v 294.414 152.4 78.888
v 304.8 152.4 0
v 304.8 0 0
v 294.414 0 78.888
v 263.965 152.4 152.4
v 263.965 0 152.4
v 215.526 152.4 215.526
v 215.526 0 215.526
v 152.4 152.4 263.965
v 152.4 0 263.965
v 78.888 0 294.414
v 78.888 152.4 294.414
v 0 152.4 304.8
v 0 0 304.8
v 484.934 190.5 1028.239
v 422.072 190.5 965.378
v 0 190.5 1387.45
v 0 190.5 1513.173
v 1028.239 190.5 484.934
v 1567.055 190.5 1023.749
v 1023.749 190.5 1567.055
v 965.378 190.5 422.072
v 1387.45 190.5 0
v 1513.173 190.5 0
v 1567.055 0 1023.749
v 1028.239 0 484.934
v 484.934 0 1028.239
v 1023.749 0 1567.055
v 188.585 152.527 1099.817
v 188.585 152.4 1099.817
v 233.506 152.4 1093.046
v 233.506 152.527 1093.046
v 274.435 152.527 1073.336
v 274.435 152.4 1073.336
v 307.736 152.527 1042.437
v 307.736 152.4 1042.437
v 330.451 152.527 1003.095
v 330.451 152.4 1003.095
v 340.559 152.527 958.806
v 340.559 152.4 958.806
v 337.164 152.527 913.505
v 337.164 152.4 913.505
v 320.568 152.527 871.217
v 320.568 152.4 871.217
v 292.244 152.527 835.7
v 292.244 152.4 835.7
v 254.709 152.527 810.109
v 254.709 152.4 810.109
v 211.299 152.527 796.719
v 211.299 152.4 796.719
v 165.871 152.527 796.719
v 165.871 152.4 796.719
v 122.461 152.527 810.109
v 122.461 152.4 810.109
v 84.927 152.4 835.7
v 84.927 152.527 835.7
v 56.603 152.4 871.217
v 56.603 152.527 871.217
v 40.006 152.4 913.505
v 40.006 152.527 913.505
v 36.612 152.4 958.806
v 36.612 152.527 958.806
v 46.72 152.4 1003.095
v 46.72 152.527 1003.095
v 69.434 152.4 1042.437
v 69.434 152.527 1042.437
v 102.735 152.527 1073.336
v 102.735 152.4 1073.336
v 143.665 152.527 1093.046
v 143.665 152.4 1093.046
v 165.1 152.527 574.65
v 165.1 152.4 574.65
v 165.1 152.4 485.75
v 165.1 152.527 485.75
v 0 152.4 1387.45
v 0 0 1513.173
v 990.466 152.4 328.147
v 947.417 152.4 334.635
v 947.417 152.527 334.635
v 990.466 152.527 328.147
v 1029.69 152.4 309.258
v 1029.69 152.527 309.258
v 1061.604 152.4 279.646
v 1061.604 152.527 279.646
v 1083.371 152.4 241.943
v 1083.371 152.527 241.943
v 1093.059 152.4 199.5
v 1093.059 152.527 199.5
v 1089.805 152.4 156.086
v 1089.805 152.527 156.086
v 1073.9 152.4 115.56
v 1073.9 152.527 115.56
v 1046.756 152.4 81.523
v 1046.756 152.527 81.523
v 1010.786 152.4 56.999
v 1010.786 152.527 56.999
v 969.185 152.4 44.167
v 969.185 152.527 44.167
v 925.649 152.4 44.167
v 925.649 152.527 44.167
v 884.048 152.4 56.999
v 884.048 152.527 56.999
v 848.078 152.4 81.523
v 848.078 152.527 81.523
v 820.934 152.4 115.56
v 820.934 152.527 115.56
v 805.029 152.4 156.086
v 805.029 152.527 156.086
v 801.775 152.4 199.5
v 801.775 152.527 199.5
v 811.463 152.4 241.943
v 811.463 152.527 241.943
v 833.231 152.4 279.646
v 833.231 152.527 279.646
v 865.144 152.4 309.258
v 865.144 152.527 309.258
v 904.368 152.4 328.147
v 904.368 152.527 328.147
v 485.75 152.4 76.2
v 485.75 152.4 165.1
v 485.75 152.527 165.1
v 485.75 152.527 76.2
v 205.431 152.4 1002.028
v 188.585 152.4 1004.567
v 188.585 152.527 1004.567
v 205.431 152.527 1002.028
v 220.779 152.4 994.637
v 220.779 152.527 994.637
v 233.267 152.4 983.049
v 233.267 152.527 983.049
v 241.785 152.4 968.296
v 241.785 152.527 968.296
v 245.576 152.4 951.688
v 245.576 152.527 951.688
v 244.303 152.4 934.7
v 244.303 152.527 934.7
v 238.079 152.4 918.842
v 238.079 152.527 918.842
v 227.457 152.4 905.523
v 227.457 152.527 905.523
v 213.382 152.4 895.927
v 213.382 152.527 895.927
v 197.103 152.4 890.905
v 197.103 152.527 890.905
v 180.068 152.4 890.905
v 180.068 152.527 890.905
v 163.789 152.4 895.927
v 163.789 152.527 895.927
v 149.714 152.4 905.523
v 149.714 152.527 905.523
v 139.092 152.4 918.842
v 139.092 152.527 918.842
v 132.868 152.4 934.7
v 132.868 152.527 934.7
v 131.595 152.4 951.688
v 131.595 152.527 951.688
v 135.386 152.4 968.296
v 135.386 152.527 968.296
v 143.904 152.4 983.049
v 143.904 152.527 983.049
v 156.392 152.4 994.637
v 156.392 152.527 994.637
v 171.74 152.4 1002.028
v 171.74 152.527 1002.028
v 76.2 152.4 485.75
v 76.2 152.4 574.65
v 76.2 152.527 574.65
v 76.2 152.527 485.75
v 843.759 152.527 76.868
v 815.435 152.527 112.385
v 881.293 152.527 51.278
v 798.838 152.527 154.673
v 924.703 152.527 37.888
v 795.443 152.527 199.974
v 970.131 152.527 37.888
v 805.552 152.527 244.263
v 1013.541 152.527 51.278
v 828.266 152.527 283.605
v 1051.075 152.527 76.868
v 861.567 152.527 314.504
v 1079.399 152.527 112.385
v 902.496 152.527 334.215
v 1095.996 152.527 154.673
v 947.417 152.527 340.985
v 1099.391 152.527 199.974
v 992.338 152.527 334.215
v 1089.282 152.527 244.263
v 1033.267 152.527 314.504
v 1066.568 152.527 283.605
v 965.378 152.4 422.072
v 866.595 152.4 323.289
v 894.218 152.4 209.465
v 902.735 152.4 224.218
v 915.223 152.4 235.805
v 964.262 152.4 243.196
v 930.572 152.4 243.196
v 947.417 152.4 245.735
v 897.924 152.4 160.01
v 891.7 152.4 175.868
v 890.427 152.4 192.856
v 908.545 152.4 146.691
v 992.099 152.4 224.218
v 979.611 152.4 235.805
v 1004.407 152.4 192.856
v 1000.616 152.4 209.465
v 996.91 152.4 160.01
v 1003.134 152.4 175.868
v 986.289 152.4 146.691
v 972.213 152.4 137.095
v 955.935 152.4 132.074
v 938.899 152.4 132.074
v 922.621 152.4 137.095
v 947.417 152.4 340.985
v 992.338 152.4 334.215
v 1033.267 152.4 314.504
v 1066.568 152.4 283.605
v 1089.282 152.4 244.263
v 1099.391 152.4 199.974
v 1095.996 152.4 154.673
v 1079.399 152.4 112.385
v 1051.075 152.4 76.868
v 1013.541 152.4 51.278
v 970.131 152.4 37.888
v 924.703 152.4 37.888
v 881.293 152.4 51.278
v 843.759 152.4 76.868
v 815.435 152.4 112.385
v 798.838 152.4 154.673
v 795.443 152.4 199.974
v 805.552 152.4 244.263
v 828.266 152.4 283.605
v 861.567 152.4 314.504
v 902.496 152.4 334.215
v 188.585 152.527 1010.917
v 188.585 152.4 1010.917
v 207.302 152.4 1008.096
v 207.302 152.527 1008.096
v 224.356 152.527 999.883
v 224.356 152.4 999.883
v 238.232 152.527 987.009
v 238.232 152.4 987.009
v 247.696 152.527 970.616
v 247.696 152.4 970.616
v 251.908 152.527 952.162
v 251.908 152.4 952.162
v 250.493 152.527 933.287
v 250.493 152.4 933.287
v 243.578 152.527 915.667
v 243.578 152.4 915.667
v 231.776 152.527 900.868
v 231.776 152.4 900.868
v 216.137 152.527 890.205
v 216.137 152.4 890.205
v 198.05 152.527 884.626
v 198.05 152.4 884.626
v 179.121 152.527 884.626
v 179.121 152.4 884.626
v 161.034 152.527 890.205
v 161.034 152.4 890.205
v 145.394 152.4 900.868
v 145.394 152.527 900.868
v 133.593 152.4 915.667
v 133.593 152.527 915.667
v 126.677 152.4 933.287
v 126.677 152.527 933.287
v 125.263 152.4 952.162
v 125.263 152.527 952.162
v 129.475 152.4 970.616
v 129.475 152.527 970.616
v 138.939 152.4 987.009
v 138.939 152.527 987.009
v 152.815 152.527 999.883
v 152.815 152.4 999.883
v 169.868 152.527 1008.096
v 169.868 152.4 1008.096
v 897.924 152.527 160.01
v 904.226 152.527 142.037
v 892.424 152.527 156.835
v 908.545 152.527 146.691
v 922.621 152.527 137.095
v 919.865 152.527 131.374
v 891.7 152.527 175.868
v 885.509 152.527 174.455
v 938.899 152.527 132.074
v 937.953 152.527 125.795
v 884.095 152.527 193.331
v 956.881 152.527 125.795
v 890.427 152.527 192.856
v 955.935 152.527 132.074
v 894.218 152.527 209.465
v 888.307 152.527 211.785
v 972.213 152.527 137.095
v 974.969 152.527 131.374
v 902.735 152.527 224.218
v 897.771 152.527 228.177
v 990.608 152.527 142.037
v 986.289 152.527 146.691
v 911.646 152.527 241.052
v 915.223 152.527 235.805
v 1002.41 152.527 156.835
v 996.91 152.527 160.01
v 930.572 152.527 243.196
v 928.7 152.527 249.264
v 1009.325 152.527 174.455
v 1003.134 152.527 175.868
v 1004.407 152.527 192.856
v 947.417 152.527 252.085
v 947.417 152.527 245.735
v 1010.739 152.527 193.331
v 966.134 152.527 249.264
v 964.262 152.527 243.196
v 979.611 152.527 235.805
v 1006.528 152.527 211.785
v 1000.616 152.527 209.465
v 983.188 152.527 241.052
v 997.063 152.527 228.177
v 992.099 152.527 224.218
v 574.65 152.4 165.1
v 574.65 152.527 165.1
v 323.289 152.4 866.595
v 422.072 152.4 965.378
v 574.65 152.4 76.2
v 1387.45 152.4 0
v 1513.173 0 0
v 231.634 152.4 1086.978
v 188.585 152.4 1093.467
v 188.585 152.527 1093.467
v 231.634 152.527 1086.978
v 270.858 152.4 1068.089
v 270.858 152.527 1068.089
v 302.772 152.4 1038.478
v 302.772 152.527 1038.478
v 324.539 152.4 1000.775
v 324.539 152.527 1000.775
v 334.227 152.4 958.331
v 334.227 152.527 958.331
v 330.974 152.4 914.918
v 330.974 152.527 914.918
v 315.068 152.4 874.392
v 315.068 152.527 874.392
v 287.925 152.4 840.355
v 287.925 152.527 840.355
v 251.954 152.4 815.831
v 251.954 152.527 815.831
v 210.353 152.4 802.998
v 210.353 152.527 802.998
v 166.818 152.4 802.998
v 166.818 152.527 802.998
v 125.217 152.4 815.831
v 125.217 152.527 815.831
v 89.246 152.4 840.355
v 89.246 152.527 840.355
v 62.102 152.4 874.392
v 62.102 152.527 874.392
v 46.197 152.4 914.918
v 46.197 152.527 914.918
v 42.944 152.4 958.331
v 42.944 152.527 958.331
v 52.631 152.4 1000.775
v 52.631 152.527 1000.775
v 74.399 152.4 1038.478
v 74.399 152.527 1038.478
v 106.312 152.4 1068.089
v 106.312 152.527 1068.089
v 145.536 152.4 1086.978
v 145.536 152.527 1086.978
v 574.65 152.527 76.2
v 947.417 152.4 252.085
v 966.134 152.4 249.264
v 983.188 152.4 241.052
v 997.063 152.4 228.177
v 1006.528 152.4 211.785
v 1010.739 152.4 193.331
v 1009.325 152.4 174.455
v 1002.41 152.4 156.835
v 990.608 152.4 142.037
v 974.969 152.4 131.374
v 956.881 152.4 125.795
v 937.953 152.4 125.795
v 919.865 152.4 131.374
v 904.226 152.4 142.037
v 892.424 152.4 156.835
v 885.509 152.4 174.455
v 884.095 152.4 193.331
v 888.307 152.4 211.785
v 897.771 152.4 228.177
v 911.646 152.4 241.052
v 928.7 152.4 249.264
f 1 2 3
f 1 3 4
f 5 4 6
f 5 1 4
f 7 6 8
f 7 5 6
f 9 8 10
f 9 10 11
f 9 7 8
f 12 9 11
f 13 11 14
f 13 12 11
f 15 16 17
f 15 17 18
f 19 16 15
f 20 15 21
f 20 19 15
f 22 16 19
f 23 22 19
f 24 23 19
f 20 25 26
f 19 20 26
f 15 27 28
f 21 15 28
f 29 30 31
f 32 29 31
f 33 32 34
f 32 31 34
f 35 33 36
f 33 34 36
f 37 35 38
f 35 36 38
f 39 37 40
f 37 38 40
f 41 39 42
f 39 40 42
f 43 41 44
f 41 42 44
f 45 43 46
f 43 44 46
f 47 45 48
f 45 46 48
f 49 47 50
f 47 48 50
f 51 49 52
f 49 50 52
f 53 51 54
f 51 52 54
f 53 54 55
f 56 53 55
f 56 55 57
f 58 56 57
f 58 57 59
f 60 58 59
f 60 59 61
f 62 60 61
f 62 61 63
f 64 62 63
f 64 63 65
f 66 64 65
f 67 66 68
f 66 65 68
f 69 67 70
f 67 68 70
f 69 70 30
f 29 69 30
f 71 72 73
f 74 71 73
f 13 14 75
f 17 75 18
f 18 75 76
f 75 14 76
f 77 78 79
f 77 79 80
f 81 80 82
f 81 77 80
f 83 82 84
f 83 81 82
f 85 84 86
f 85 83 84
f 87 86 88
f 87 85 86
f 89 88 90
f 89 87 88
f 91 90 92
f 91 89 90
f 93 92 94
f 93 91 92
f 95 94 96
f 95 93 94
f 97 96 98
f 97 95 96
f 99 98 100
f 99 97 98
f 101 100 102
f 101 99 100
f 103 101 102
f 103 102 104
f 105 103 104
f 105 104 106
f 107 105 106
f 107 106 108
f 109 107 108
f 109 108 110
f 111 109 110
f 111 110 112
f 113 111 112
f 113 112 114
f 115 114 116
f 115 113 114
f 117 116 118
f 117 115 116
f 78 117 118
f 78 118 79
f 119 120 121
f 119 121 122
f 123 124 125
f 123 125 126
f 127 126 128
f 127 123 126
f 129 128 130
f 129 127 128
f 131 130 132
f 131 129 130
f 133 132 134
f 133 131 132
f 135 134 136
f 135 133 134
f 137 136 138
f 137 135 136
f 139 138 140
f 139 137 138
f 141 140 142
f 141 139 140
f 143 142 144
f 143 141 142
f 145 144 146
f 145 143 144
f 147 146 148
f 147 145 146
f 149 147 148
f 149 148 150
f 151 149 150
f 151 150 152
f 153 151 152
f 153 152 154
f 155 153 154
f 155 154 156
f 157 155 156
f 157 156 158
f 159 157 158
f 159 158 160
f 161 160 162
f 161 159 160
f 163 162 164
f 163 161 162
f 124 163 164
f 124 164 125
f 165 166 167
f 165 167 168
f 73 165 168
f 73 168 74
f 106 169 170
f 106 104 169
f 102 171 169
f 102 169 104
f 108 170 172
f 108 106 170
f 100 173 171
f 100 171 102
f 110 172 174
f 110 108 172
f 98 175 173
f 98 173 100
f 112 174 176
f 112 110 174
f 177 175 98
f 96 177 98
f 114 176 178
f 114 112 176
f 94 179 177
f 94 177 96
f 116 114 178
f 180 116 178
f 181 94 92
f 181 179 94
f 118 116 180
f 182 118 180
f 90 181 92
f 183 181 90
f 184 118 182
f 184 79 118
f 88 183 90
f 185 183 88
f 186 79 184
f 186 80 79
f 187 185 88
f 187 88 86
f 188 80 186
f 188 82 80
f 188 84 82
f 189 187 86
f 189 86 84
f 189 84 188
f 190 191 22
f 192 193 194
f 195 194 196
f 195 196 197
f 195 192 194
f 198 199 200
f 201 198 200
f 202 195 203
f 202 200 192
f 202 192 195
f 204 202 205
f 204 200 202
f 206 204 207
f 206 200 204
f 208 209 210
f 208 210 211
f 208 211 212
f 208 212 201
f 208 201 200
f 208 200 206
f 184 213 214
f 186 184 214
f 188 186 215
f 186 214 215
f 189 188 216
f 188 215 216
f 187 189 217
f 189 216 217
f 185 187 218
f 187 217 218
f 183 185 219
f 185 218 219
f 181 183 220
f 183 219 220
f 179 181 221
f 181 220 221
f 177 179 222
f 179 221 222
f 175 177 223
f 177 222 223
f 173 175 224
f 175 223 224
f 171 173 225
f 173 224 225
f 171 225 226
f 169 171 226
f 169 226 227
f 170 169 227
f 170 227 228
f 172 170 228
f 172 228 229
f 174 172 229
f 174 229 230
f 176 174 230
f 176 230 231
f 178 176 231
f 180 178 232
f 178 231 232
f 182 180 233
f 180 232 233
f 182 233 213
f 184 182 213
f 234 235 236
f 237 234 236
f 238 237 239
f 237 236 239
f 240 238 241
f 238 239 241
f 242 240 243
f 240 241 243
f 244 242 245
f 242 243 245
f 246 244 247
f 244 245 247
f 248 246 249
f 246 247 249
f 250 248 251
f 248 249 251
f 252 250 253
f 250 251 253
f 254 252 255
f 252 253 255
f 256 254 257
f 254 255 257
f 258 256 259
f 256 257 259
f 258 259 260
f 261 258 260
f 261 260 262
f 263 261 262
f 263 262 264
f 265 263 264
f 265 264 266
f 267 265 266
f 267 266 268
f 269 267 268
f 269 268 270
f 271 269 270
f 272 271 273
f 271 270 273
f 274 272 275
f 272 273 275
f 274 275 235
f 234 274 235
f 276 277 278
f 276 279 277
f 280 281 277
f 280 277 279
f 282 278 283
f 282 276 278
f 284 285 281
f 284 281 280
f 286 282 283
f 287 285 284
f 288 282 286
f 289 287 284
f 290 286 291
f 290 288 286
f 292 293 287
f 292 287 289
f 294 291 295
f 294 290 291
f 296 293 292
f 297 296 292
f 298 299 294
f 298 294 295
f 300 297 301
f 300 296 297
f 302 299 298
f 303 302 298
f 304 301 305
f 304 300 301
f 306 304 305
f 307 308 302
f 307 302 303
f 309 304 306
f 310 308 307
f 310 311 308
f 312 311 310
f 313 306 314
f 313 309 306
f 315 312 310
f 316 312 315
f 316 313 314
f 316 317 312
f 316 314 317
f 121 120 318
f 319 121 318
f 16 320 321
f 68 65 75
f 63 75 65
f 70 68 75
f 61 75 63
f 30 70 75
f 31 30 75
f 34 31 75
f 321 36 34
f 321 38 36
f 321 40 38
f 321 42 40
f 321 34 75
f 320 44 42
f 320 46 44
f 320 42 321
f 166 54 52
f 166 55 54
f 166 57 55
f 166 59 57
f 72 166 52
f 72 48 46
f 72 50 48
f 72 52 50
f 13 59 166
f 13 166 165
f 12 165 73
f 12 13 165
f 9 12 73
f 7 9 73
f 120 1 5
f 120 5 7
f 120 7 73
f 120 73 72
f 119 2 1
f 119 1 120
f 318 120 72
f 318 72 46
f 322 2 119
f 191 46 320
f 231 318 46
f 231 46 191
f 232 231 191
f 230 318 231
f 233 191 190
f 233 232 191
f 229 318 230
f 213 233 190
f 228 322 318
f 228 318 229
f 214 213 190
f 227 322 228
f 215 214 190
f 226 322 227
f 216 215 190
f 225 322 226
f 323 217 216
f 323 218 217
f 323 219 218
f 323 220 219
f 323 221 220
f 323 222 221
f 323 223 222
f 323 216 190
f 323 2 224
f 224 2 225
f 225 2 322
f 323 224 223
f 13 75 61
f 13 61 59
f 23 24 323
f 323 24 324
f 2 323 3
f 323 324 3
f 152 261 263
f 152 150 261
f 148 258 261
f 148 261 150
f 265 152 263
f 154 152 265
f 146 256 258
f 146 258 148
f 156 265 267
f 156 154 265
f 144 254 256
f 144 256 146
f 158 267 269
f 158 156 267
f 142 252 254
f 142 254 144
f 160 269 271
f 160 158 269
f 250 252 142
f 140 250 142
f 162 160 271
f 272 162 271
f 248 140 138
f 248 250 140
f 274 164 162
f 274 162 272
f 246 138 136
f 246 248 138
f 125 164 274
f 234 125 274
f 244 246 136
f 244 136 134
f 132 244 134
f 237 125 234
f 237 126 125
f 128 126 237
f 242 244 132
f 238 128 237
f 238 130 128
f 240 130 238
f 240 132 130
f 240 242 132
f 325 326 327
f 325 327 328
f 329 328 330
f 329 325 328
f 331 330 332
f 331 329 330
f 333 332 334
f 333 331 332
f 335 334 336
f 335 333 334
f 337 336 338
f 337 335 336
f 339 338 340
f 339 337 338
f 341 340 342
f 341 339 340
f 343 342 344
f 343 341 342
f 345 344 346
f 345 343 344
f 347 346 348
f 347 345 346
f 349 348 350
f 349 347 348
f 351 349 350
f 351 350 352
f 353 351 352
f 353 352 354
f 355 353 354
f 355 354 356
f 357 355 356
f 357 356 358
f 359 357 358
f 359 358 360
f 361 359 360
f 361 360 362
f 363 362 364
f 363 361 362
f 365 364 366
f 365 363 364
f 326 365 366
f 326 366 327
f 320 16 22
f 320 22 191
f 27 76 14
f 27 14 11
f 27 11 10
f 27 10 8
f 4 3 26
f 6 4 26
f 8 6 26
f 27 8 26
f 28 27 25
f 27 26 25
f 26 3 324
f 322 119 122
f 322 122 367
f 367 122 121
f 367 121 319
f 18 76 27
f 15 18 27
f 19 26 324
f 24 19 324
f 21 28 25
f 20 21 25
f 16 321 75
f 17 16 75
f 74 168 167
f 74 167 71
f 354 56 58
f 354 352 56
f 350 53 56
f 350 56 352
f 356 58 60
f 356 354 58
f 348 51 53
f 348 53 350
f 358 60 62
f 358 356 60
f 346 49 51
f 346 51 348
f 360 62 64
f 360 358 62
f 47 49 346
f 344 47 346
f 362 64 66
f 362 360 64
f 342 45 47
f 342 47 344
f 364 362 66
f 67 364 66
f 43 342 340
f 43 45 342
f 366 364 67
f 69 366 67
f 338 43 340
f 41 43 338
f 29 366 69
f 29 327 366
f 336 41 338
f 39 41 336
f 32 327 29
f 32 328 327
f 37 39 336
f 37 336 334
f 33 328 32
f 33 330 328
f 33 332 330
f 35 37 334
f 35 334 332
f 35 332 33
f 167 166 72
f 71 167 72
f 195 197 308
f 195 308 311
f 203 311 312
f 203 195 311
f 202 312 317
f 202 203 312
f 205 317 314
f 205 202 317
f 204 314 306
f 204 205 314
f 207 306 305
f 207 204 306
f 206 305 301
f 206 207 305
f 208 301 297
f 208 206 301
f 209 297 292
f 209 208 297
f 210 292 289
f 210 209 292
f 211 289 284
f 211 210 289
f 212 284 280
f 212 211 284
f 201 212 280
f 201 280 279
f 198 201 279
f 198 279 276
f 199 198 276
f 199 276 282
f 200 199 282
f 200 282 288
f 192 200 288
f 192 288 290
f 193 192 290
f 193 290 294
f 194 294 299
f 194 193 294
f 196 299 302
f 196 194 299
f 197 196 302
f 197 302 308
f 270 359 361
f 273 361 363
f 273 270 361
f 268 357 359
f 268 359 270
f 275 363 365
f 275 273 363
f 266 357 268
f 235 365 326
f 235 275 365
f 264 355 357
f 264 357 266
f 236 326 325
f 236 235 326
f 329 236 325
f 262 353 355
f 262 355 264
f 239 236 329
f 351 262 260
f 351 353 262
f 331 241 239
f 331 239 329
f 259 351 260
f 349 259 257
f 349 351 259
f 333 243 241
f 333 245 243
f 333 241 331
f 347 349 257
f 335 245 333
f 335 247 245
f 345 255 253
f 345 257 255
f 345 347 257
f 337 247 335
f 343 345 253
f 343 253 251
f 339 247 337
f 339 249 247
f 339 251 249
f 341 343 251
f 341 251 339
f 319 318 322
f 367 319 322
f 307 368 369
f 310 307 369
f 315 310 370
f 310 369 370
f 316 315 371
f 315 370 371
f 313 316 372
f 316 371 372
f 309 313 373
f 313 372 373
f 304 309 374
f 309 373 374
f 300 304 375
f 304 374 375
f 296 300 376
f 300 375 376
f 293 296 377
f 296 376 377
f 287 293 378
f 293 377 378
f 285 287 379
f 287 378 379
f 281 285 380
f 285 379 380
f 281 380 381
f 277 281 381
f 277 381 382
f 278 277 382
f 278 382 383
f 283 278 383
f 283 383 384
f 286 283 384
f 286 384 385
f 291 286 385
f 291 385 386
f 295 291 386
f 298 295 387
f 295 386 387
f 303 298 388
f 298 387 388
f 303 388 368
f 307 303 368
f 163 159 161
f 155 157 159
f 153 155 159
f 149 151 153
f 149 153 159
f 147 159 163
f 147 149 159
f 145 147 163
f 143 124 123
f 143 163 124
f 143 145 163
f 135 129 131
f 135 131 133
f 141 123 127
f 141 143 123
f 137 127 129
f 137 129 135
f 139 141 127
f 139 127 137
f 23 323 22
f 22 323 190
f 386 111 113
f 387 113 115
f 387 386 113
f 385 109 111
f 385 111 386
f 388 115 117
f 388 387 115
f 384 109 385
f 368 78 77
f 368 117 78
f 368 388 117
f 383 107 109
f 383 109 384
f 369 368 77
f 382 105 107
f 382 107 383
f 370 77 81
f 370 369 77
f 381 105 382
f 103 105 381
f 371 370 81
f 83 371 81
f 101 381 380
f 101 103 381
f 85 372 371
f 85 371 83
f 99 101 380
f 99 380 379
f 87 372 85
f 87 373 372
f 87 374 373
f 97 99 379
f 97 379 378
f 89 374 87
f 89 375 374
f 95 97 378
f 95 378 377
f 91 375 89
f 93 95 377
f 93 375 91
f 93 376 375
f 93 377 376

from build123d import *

# Parameters (mm, degrees)
BOSS_EXTRUDE1_DEPTH = 152.4
CUT_EXTRUDE1_DEPTH  = 152.4
BOSS_EXTRUDE2_DEPTH = 38.1
BOSS_EXTRUDE3_DEPTH = 190.5
BOSS_EXTRUDE4_DEPTH = 768.35
SKETCH9_R           = 152.4
SKETCH9_R_2         = 146.05
SKETCH9_R_3         = 63.5
SKETCH9_R_4         = 57.15
SKETCH9_W           = 88.9
SKETCH9_H           = 88.9
BOSS_EXTRUDE5_DEPTH = 0.127


with BuildPart() as part:
    # Sketch2 → Boss-Extrude1 (new body)
    with BuildSketch(Plane(origin=(0, 0, 0), x_dir=(1, 0, 0), z_dir=(0, 1, 0))):
        Polygon((0, 0), (0, -1513.1731564), (1513.1731564, 0), align=None)
    extrude(amount=BOSS_EXTRUDE1_DEPTH)

    # Sketch3 → Cut-Extrude1 (cut)
    with BuildSketch(Plane(origin=(0, 152.4, 0), x_dir=(1, 0, 0), z_dir=(0, 1, 0))):
        with BuildLine():
            Line((0, 0), (304.8, 0))
            ThreePointArc((304.8, 0), (215.526146906, -215.526146906), (0, -304.8))
            Line((0, -304.8), (0, 0))
        make_face()
    extrude(amount=-CUT_EXTRUDE1_DEPTH, mode=Mode.SUBTRACT)

    # Sketch4 → Boss-Extrude2 (add)
    with BuildSketch(Plane(origin=(0, 152.4, 0), x_dir=(1, 0, 0), z_dir=(0, 1, 0))):
        Polygon((0, -1513.1731564), (1513.1731564, 0), (1387.449570705, 0), (0, -1387.449570705), align=None)
    extrude(amount=BOSS_EXTRUDE2_DEPTH)

    # Sketch5 → Boss-Extrude3 (add)
    with BuildSketch(Plane(origin=(0, 0, 0), x_dir=(1, 0, 0), z_dir=(0, 1, 0))):
        Polygon((1028.239325862, -484.933830538), (484.933830538, -1028.239325862), (1023.749197802, -1567.054693127), (1567.054693127, -1023.749197802), align=None)
    extrude(amount=BOSS_EXTRUDE3_DEPTH)

    # Sketch6 → Boss-Extrude4 (add)
    with BuildSketch(Plane(origin=(-271.652747662, 0, 271.652747662), x_dir=(0.7071067811865476, 0, 0.7071067811865476), z_dir=(-0.7071067811865476, 0, 0.7071067811865476))):
        Polygon((981.075, 190.5), (841.375, 152.4), (981.075, 152.4), align=None)
    extrude(amount=-BOSS_EXTRUDE4_DEPTH)

    # Sketch9 → Boss-Extrude5 (add)
    # profile 1 of 6: a face of its own
    with BuildSketch(Plane(origin=(0, 152.4, 0), x_dir=(1, 0, 0), z_dir=(0, 1, 0))):
        with Locations(Location((947.417020773, -188.585378542, 0), (0, 0, 270))):
            Circle(SKETCH9_R)
        with Locations(Location((947.417020773, -188.585378542, 0), (0, 0, 270))):
            Circle(SKETCH9_R_2, mode=Mode.SUBTRACT)
    # profile 2 of 6: a face of its own
    with BuildSketch(Plane(origin=(0, 152.4, 0), x_dir=(1, 0, 0), z_dir=(0, 1, 0))):
        with Locations(Location((947.417020773, -188.585378542, 0), (0, 0, 270))):
            Circle(SKETCH9_R_3)
        with Locations(Location((947.417020773, -188.585378542, 0), (0, 0, 270))):
            Circle(SKETCH9_R_4, mode=Mode.SUBTRACT)
    # profile 3 of 6: a face of its own
    with BuildSketch(Plane(origin=(0, 152.4, 0), x_dir=(1, 0, 0), z_dir=(0, 1, 0))):
        with Locations(Location((188.585378542, -947.417020773, 0), (0, 0, 270))):
            Circle(SKETCH9_R)
        with Locations(Location((188.585378542, -947.417020773, 0), (0, 0, 270))):
            Circle(SKETCH9_R_2, mode=Mode.SUBTRACT)
    # profile 4 of 6: a face of its own
    with BuildSketch(Plane(origin=(0, 152.4, 0), x_dir=(1, 0, 0), z_dir=(0, 1, 0))):
        with Locations(Location((188.585378542, -947.417020773, 0), (0, 0, 270))):
            Circle(SKETCH9_R_3)
        with Locations(Location((188.585378542, -947.417020773, 0), (0, 0, 270))):
            Circle(SKETCH9_R_4, mode=Mode.SUBTRACT)
    # profile 5 of 6: a face of its own
    with BuildSketch(Plane(origin=(0, 152.4, 0), x_dir=(1, 0, 0), z_dir=(0, 1, 0))):
        with Locations((530.199570705, -120.65)):
            Rectangle(SKETCH9_W, SKETCH9_H)
    # profile 6 of 6: a face of its own
    with BuildSketch(Plane(origin=(0, 152.4, 0), x_dir=(1, 0, 0), z_dir=(0, 1, 0))):
        with Locations((120.65, -530.199570705)):
            Rectangle(SKETCH9_W, SKETCH9_H)
    extrude(amount=BOSS_EXTRUDE5_DEPTH)


solid = part.part
